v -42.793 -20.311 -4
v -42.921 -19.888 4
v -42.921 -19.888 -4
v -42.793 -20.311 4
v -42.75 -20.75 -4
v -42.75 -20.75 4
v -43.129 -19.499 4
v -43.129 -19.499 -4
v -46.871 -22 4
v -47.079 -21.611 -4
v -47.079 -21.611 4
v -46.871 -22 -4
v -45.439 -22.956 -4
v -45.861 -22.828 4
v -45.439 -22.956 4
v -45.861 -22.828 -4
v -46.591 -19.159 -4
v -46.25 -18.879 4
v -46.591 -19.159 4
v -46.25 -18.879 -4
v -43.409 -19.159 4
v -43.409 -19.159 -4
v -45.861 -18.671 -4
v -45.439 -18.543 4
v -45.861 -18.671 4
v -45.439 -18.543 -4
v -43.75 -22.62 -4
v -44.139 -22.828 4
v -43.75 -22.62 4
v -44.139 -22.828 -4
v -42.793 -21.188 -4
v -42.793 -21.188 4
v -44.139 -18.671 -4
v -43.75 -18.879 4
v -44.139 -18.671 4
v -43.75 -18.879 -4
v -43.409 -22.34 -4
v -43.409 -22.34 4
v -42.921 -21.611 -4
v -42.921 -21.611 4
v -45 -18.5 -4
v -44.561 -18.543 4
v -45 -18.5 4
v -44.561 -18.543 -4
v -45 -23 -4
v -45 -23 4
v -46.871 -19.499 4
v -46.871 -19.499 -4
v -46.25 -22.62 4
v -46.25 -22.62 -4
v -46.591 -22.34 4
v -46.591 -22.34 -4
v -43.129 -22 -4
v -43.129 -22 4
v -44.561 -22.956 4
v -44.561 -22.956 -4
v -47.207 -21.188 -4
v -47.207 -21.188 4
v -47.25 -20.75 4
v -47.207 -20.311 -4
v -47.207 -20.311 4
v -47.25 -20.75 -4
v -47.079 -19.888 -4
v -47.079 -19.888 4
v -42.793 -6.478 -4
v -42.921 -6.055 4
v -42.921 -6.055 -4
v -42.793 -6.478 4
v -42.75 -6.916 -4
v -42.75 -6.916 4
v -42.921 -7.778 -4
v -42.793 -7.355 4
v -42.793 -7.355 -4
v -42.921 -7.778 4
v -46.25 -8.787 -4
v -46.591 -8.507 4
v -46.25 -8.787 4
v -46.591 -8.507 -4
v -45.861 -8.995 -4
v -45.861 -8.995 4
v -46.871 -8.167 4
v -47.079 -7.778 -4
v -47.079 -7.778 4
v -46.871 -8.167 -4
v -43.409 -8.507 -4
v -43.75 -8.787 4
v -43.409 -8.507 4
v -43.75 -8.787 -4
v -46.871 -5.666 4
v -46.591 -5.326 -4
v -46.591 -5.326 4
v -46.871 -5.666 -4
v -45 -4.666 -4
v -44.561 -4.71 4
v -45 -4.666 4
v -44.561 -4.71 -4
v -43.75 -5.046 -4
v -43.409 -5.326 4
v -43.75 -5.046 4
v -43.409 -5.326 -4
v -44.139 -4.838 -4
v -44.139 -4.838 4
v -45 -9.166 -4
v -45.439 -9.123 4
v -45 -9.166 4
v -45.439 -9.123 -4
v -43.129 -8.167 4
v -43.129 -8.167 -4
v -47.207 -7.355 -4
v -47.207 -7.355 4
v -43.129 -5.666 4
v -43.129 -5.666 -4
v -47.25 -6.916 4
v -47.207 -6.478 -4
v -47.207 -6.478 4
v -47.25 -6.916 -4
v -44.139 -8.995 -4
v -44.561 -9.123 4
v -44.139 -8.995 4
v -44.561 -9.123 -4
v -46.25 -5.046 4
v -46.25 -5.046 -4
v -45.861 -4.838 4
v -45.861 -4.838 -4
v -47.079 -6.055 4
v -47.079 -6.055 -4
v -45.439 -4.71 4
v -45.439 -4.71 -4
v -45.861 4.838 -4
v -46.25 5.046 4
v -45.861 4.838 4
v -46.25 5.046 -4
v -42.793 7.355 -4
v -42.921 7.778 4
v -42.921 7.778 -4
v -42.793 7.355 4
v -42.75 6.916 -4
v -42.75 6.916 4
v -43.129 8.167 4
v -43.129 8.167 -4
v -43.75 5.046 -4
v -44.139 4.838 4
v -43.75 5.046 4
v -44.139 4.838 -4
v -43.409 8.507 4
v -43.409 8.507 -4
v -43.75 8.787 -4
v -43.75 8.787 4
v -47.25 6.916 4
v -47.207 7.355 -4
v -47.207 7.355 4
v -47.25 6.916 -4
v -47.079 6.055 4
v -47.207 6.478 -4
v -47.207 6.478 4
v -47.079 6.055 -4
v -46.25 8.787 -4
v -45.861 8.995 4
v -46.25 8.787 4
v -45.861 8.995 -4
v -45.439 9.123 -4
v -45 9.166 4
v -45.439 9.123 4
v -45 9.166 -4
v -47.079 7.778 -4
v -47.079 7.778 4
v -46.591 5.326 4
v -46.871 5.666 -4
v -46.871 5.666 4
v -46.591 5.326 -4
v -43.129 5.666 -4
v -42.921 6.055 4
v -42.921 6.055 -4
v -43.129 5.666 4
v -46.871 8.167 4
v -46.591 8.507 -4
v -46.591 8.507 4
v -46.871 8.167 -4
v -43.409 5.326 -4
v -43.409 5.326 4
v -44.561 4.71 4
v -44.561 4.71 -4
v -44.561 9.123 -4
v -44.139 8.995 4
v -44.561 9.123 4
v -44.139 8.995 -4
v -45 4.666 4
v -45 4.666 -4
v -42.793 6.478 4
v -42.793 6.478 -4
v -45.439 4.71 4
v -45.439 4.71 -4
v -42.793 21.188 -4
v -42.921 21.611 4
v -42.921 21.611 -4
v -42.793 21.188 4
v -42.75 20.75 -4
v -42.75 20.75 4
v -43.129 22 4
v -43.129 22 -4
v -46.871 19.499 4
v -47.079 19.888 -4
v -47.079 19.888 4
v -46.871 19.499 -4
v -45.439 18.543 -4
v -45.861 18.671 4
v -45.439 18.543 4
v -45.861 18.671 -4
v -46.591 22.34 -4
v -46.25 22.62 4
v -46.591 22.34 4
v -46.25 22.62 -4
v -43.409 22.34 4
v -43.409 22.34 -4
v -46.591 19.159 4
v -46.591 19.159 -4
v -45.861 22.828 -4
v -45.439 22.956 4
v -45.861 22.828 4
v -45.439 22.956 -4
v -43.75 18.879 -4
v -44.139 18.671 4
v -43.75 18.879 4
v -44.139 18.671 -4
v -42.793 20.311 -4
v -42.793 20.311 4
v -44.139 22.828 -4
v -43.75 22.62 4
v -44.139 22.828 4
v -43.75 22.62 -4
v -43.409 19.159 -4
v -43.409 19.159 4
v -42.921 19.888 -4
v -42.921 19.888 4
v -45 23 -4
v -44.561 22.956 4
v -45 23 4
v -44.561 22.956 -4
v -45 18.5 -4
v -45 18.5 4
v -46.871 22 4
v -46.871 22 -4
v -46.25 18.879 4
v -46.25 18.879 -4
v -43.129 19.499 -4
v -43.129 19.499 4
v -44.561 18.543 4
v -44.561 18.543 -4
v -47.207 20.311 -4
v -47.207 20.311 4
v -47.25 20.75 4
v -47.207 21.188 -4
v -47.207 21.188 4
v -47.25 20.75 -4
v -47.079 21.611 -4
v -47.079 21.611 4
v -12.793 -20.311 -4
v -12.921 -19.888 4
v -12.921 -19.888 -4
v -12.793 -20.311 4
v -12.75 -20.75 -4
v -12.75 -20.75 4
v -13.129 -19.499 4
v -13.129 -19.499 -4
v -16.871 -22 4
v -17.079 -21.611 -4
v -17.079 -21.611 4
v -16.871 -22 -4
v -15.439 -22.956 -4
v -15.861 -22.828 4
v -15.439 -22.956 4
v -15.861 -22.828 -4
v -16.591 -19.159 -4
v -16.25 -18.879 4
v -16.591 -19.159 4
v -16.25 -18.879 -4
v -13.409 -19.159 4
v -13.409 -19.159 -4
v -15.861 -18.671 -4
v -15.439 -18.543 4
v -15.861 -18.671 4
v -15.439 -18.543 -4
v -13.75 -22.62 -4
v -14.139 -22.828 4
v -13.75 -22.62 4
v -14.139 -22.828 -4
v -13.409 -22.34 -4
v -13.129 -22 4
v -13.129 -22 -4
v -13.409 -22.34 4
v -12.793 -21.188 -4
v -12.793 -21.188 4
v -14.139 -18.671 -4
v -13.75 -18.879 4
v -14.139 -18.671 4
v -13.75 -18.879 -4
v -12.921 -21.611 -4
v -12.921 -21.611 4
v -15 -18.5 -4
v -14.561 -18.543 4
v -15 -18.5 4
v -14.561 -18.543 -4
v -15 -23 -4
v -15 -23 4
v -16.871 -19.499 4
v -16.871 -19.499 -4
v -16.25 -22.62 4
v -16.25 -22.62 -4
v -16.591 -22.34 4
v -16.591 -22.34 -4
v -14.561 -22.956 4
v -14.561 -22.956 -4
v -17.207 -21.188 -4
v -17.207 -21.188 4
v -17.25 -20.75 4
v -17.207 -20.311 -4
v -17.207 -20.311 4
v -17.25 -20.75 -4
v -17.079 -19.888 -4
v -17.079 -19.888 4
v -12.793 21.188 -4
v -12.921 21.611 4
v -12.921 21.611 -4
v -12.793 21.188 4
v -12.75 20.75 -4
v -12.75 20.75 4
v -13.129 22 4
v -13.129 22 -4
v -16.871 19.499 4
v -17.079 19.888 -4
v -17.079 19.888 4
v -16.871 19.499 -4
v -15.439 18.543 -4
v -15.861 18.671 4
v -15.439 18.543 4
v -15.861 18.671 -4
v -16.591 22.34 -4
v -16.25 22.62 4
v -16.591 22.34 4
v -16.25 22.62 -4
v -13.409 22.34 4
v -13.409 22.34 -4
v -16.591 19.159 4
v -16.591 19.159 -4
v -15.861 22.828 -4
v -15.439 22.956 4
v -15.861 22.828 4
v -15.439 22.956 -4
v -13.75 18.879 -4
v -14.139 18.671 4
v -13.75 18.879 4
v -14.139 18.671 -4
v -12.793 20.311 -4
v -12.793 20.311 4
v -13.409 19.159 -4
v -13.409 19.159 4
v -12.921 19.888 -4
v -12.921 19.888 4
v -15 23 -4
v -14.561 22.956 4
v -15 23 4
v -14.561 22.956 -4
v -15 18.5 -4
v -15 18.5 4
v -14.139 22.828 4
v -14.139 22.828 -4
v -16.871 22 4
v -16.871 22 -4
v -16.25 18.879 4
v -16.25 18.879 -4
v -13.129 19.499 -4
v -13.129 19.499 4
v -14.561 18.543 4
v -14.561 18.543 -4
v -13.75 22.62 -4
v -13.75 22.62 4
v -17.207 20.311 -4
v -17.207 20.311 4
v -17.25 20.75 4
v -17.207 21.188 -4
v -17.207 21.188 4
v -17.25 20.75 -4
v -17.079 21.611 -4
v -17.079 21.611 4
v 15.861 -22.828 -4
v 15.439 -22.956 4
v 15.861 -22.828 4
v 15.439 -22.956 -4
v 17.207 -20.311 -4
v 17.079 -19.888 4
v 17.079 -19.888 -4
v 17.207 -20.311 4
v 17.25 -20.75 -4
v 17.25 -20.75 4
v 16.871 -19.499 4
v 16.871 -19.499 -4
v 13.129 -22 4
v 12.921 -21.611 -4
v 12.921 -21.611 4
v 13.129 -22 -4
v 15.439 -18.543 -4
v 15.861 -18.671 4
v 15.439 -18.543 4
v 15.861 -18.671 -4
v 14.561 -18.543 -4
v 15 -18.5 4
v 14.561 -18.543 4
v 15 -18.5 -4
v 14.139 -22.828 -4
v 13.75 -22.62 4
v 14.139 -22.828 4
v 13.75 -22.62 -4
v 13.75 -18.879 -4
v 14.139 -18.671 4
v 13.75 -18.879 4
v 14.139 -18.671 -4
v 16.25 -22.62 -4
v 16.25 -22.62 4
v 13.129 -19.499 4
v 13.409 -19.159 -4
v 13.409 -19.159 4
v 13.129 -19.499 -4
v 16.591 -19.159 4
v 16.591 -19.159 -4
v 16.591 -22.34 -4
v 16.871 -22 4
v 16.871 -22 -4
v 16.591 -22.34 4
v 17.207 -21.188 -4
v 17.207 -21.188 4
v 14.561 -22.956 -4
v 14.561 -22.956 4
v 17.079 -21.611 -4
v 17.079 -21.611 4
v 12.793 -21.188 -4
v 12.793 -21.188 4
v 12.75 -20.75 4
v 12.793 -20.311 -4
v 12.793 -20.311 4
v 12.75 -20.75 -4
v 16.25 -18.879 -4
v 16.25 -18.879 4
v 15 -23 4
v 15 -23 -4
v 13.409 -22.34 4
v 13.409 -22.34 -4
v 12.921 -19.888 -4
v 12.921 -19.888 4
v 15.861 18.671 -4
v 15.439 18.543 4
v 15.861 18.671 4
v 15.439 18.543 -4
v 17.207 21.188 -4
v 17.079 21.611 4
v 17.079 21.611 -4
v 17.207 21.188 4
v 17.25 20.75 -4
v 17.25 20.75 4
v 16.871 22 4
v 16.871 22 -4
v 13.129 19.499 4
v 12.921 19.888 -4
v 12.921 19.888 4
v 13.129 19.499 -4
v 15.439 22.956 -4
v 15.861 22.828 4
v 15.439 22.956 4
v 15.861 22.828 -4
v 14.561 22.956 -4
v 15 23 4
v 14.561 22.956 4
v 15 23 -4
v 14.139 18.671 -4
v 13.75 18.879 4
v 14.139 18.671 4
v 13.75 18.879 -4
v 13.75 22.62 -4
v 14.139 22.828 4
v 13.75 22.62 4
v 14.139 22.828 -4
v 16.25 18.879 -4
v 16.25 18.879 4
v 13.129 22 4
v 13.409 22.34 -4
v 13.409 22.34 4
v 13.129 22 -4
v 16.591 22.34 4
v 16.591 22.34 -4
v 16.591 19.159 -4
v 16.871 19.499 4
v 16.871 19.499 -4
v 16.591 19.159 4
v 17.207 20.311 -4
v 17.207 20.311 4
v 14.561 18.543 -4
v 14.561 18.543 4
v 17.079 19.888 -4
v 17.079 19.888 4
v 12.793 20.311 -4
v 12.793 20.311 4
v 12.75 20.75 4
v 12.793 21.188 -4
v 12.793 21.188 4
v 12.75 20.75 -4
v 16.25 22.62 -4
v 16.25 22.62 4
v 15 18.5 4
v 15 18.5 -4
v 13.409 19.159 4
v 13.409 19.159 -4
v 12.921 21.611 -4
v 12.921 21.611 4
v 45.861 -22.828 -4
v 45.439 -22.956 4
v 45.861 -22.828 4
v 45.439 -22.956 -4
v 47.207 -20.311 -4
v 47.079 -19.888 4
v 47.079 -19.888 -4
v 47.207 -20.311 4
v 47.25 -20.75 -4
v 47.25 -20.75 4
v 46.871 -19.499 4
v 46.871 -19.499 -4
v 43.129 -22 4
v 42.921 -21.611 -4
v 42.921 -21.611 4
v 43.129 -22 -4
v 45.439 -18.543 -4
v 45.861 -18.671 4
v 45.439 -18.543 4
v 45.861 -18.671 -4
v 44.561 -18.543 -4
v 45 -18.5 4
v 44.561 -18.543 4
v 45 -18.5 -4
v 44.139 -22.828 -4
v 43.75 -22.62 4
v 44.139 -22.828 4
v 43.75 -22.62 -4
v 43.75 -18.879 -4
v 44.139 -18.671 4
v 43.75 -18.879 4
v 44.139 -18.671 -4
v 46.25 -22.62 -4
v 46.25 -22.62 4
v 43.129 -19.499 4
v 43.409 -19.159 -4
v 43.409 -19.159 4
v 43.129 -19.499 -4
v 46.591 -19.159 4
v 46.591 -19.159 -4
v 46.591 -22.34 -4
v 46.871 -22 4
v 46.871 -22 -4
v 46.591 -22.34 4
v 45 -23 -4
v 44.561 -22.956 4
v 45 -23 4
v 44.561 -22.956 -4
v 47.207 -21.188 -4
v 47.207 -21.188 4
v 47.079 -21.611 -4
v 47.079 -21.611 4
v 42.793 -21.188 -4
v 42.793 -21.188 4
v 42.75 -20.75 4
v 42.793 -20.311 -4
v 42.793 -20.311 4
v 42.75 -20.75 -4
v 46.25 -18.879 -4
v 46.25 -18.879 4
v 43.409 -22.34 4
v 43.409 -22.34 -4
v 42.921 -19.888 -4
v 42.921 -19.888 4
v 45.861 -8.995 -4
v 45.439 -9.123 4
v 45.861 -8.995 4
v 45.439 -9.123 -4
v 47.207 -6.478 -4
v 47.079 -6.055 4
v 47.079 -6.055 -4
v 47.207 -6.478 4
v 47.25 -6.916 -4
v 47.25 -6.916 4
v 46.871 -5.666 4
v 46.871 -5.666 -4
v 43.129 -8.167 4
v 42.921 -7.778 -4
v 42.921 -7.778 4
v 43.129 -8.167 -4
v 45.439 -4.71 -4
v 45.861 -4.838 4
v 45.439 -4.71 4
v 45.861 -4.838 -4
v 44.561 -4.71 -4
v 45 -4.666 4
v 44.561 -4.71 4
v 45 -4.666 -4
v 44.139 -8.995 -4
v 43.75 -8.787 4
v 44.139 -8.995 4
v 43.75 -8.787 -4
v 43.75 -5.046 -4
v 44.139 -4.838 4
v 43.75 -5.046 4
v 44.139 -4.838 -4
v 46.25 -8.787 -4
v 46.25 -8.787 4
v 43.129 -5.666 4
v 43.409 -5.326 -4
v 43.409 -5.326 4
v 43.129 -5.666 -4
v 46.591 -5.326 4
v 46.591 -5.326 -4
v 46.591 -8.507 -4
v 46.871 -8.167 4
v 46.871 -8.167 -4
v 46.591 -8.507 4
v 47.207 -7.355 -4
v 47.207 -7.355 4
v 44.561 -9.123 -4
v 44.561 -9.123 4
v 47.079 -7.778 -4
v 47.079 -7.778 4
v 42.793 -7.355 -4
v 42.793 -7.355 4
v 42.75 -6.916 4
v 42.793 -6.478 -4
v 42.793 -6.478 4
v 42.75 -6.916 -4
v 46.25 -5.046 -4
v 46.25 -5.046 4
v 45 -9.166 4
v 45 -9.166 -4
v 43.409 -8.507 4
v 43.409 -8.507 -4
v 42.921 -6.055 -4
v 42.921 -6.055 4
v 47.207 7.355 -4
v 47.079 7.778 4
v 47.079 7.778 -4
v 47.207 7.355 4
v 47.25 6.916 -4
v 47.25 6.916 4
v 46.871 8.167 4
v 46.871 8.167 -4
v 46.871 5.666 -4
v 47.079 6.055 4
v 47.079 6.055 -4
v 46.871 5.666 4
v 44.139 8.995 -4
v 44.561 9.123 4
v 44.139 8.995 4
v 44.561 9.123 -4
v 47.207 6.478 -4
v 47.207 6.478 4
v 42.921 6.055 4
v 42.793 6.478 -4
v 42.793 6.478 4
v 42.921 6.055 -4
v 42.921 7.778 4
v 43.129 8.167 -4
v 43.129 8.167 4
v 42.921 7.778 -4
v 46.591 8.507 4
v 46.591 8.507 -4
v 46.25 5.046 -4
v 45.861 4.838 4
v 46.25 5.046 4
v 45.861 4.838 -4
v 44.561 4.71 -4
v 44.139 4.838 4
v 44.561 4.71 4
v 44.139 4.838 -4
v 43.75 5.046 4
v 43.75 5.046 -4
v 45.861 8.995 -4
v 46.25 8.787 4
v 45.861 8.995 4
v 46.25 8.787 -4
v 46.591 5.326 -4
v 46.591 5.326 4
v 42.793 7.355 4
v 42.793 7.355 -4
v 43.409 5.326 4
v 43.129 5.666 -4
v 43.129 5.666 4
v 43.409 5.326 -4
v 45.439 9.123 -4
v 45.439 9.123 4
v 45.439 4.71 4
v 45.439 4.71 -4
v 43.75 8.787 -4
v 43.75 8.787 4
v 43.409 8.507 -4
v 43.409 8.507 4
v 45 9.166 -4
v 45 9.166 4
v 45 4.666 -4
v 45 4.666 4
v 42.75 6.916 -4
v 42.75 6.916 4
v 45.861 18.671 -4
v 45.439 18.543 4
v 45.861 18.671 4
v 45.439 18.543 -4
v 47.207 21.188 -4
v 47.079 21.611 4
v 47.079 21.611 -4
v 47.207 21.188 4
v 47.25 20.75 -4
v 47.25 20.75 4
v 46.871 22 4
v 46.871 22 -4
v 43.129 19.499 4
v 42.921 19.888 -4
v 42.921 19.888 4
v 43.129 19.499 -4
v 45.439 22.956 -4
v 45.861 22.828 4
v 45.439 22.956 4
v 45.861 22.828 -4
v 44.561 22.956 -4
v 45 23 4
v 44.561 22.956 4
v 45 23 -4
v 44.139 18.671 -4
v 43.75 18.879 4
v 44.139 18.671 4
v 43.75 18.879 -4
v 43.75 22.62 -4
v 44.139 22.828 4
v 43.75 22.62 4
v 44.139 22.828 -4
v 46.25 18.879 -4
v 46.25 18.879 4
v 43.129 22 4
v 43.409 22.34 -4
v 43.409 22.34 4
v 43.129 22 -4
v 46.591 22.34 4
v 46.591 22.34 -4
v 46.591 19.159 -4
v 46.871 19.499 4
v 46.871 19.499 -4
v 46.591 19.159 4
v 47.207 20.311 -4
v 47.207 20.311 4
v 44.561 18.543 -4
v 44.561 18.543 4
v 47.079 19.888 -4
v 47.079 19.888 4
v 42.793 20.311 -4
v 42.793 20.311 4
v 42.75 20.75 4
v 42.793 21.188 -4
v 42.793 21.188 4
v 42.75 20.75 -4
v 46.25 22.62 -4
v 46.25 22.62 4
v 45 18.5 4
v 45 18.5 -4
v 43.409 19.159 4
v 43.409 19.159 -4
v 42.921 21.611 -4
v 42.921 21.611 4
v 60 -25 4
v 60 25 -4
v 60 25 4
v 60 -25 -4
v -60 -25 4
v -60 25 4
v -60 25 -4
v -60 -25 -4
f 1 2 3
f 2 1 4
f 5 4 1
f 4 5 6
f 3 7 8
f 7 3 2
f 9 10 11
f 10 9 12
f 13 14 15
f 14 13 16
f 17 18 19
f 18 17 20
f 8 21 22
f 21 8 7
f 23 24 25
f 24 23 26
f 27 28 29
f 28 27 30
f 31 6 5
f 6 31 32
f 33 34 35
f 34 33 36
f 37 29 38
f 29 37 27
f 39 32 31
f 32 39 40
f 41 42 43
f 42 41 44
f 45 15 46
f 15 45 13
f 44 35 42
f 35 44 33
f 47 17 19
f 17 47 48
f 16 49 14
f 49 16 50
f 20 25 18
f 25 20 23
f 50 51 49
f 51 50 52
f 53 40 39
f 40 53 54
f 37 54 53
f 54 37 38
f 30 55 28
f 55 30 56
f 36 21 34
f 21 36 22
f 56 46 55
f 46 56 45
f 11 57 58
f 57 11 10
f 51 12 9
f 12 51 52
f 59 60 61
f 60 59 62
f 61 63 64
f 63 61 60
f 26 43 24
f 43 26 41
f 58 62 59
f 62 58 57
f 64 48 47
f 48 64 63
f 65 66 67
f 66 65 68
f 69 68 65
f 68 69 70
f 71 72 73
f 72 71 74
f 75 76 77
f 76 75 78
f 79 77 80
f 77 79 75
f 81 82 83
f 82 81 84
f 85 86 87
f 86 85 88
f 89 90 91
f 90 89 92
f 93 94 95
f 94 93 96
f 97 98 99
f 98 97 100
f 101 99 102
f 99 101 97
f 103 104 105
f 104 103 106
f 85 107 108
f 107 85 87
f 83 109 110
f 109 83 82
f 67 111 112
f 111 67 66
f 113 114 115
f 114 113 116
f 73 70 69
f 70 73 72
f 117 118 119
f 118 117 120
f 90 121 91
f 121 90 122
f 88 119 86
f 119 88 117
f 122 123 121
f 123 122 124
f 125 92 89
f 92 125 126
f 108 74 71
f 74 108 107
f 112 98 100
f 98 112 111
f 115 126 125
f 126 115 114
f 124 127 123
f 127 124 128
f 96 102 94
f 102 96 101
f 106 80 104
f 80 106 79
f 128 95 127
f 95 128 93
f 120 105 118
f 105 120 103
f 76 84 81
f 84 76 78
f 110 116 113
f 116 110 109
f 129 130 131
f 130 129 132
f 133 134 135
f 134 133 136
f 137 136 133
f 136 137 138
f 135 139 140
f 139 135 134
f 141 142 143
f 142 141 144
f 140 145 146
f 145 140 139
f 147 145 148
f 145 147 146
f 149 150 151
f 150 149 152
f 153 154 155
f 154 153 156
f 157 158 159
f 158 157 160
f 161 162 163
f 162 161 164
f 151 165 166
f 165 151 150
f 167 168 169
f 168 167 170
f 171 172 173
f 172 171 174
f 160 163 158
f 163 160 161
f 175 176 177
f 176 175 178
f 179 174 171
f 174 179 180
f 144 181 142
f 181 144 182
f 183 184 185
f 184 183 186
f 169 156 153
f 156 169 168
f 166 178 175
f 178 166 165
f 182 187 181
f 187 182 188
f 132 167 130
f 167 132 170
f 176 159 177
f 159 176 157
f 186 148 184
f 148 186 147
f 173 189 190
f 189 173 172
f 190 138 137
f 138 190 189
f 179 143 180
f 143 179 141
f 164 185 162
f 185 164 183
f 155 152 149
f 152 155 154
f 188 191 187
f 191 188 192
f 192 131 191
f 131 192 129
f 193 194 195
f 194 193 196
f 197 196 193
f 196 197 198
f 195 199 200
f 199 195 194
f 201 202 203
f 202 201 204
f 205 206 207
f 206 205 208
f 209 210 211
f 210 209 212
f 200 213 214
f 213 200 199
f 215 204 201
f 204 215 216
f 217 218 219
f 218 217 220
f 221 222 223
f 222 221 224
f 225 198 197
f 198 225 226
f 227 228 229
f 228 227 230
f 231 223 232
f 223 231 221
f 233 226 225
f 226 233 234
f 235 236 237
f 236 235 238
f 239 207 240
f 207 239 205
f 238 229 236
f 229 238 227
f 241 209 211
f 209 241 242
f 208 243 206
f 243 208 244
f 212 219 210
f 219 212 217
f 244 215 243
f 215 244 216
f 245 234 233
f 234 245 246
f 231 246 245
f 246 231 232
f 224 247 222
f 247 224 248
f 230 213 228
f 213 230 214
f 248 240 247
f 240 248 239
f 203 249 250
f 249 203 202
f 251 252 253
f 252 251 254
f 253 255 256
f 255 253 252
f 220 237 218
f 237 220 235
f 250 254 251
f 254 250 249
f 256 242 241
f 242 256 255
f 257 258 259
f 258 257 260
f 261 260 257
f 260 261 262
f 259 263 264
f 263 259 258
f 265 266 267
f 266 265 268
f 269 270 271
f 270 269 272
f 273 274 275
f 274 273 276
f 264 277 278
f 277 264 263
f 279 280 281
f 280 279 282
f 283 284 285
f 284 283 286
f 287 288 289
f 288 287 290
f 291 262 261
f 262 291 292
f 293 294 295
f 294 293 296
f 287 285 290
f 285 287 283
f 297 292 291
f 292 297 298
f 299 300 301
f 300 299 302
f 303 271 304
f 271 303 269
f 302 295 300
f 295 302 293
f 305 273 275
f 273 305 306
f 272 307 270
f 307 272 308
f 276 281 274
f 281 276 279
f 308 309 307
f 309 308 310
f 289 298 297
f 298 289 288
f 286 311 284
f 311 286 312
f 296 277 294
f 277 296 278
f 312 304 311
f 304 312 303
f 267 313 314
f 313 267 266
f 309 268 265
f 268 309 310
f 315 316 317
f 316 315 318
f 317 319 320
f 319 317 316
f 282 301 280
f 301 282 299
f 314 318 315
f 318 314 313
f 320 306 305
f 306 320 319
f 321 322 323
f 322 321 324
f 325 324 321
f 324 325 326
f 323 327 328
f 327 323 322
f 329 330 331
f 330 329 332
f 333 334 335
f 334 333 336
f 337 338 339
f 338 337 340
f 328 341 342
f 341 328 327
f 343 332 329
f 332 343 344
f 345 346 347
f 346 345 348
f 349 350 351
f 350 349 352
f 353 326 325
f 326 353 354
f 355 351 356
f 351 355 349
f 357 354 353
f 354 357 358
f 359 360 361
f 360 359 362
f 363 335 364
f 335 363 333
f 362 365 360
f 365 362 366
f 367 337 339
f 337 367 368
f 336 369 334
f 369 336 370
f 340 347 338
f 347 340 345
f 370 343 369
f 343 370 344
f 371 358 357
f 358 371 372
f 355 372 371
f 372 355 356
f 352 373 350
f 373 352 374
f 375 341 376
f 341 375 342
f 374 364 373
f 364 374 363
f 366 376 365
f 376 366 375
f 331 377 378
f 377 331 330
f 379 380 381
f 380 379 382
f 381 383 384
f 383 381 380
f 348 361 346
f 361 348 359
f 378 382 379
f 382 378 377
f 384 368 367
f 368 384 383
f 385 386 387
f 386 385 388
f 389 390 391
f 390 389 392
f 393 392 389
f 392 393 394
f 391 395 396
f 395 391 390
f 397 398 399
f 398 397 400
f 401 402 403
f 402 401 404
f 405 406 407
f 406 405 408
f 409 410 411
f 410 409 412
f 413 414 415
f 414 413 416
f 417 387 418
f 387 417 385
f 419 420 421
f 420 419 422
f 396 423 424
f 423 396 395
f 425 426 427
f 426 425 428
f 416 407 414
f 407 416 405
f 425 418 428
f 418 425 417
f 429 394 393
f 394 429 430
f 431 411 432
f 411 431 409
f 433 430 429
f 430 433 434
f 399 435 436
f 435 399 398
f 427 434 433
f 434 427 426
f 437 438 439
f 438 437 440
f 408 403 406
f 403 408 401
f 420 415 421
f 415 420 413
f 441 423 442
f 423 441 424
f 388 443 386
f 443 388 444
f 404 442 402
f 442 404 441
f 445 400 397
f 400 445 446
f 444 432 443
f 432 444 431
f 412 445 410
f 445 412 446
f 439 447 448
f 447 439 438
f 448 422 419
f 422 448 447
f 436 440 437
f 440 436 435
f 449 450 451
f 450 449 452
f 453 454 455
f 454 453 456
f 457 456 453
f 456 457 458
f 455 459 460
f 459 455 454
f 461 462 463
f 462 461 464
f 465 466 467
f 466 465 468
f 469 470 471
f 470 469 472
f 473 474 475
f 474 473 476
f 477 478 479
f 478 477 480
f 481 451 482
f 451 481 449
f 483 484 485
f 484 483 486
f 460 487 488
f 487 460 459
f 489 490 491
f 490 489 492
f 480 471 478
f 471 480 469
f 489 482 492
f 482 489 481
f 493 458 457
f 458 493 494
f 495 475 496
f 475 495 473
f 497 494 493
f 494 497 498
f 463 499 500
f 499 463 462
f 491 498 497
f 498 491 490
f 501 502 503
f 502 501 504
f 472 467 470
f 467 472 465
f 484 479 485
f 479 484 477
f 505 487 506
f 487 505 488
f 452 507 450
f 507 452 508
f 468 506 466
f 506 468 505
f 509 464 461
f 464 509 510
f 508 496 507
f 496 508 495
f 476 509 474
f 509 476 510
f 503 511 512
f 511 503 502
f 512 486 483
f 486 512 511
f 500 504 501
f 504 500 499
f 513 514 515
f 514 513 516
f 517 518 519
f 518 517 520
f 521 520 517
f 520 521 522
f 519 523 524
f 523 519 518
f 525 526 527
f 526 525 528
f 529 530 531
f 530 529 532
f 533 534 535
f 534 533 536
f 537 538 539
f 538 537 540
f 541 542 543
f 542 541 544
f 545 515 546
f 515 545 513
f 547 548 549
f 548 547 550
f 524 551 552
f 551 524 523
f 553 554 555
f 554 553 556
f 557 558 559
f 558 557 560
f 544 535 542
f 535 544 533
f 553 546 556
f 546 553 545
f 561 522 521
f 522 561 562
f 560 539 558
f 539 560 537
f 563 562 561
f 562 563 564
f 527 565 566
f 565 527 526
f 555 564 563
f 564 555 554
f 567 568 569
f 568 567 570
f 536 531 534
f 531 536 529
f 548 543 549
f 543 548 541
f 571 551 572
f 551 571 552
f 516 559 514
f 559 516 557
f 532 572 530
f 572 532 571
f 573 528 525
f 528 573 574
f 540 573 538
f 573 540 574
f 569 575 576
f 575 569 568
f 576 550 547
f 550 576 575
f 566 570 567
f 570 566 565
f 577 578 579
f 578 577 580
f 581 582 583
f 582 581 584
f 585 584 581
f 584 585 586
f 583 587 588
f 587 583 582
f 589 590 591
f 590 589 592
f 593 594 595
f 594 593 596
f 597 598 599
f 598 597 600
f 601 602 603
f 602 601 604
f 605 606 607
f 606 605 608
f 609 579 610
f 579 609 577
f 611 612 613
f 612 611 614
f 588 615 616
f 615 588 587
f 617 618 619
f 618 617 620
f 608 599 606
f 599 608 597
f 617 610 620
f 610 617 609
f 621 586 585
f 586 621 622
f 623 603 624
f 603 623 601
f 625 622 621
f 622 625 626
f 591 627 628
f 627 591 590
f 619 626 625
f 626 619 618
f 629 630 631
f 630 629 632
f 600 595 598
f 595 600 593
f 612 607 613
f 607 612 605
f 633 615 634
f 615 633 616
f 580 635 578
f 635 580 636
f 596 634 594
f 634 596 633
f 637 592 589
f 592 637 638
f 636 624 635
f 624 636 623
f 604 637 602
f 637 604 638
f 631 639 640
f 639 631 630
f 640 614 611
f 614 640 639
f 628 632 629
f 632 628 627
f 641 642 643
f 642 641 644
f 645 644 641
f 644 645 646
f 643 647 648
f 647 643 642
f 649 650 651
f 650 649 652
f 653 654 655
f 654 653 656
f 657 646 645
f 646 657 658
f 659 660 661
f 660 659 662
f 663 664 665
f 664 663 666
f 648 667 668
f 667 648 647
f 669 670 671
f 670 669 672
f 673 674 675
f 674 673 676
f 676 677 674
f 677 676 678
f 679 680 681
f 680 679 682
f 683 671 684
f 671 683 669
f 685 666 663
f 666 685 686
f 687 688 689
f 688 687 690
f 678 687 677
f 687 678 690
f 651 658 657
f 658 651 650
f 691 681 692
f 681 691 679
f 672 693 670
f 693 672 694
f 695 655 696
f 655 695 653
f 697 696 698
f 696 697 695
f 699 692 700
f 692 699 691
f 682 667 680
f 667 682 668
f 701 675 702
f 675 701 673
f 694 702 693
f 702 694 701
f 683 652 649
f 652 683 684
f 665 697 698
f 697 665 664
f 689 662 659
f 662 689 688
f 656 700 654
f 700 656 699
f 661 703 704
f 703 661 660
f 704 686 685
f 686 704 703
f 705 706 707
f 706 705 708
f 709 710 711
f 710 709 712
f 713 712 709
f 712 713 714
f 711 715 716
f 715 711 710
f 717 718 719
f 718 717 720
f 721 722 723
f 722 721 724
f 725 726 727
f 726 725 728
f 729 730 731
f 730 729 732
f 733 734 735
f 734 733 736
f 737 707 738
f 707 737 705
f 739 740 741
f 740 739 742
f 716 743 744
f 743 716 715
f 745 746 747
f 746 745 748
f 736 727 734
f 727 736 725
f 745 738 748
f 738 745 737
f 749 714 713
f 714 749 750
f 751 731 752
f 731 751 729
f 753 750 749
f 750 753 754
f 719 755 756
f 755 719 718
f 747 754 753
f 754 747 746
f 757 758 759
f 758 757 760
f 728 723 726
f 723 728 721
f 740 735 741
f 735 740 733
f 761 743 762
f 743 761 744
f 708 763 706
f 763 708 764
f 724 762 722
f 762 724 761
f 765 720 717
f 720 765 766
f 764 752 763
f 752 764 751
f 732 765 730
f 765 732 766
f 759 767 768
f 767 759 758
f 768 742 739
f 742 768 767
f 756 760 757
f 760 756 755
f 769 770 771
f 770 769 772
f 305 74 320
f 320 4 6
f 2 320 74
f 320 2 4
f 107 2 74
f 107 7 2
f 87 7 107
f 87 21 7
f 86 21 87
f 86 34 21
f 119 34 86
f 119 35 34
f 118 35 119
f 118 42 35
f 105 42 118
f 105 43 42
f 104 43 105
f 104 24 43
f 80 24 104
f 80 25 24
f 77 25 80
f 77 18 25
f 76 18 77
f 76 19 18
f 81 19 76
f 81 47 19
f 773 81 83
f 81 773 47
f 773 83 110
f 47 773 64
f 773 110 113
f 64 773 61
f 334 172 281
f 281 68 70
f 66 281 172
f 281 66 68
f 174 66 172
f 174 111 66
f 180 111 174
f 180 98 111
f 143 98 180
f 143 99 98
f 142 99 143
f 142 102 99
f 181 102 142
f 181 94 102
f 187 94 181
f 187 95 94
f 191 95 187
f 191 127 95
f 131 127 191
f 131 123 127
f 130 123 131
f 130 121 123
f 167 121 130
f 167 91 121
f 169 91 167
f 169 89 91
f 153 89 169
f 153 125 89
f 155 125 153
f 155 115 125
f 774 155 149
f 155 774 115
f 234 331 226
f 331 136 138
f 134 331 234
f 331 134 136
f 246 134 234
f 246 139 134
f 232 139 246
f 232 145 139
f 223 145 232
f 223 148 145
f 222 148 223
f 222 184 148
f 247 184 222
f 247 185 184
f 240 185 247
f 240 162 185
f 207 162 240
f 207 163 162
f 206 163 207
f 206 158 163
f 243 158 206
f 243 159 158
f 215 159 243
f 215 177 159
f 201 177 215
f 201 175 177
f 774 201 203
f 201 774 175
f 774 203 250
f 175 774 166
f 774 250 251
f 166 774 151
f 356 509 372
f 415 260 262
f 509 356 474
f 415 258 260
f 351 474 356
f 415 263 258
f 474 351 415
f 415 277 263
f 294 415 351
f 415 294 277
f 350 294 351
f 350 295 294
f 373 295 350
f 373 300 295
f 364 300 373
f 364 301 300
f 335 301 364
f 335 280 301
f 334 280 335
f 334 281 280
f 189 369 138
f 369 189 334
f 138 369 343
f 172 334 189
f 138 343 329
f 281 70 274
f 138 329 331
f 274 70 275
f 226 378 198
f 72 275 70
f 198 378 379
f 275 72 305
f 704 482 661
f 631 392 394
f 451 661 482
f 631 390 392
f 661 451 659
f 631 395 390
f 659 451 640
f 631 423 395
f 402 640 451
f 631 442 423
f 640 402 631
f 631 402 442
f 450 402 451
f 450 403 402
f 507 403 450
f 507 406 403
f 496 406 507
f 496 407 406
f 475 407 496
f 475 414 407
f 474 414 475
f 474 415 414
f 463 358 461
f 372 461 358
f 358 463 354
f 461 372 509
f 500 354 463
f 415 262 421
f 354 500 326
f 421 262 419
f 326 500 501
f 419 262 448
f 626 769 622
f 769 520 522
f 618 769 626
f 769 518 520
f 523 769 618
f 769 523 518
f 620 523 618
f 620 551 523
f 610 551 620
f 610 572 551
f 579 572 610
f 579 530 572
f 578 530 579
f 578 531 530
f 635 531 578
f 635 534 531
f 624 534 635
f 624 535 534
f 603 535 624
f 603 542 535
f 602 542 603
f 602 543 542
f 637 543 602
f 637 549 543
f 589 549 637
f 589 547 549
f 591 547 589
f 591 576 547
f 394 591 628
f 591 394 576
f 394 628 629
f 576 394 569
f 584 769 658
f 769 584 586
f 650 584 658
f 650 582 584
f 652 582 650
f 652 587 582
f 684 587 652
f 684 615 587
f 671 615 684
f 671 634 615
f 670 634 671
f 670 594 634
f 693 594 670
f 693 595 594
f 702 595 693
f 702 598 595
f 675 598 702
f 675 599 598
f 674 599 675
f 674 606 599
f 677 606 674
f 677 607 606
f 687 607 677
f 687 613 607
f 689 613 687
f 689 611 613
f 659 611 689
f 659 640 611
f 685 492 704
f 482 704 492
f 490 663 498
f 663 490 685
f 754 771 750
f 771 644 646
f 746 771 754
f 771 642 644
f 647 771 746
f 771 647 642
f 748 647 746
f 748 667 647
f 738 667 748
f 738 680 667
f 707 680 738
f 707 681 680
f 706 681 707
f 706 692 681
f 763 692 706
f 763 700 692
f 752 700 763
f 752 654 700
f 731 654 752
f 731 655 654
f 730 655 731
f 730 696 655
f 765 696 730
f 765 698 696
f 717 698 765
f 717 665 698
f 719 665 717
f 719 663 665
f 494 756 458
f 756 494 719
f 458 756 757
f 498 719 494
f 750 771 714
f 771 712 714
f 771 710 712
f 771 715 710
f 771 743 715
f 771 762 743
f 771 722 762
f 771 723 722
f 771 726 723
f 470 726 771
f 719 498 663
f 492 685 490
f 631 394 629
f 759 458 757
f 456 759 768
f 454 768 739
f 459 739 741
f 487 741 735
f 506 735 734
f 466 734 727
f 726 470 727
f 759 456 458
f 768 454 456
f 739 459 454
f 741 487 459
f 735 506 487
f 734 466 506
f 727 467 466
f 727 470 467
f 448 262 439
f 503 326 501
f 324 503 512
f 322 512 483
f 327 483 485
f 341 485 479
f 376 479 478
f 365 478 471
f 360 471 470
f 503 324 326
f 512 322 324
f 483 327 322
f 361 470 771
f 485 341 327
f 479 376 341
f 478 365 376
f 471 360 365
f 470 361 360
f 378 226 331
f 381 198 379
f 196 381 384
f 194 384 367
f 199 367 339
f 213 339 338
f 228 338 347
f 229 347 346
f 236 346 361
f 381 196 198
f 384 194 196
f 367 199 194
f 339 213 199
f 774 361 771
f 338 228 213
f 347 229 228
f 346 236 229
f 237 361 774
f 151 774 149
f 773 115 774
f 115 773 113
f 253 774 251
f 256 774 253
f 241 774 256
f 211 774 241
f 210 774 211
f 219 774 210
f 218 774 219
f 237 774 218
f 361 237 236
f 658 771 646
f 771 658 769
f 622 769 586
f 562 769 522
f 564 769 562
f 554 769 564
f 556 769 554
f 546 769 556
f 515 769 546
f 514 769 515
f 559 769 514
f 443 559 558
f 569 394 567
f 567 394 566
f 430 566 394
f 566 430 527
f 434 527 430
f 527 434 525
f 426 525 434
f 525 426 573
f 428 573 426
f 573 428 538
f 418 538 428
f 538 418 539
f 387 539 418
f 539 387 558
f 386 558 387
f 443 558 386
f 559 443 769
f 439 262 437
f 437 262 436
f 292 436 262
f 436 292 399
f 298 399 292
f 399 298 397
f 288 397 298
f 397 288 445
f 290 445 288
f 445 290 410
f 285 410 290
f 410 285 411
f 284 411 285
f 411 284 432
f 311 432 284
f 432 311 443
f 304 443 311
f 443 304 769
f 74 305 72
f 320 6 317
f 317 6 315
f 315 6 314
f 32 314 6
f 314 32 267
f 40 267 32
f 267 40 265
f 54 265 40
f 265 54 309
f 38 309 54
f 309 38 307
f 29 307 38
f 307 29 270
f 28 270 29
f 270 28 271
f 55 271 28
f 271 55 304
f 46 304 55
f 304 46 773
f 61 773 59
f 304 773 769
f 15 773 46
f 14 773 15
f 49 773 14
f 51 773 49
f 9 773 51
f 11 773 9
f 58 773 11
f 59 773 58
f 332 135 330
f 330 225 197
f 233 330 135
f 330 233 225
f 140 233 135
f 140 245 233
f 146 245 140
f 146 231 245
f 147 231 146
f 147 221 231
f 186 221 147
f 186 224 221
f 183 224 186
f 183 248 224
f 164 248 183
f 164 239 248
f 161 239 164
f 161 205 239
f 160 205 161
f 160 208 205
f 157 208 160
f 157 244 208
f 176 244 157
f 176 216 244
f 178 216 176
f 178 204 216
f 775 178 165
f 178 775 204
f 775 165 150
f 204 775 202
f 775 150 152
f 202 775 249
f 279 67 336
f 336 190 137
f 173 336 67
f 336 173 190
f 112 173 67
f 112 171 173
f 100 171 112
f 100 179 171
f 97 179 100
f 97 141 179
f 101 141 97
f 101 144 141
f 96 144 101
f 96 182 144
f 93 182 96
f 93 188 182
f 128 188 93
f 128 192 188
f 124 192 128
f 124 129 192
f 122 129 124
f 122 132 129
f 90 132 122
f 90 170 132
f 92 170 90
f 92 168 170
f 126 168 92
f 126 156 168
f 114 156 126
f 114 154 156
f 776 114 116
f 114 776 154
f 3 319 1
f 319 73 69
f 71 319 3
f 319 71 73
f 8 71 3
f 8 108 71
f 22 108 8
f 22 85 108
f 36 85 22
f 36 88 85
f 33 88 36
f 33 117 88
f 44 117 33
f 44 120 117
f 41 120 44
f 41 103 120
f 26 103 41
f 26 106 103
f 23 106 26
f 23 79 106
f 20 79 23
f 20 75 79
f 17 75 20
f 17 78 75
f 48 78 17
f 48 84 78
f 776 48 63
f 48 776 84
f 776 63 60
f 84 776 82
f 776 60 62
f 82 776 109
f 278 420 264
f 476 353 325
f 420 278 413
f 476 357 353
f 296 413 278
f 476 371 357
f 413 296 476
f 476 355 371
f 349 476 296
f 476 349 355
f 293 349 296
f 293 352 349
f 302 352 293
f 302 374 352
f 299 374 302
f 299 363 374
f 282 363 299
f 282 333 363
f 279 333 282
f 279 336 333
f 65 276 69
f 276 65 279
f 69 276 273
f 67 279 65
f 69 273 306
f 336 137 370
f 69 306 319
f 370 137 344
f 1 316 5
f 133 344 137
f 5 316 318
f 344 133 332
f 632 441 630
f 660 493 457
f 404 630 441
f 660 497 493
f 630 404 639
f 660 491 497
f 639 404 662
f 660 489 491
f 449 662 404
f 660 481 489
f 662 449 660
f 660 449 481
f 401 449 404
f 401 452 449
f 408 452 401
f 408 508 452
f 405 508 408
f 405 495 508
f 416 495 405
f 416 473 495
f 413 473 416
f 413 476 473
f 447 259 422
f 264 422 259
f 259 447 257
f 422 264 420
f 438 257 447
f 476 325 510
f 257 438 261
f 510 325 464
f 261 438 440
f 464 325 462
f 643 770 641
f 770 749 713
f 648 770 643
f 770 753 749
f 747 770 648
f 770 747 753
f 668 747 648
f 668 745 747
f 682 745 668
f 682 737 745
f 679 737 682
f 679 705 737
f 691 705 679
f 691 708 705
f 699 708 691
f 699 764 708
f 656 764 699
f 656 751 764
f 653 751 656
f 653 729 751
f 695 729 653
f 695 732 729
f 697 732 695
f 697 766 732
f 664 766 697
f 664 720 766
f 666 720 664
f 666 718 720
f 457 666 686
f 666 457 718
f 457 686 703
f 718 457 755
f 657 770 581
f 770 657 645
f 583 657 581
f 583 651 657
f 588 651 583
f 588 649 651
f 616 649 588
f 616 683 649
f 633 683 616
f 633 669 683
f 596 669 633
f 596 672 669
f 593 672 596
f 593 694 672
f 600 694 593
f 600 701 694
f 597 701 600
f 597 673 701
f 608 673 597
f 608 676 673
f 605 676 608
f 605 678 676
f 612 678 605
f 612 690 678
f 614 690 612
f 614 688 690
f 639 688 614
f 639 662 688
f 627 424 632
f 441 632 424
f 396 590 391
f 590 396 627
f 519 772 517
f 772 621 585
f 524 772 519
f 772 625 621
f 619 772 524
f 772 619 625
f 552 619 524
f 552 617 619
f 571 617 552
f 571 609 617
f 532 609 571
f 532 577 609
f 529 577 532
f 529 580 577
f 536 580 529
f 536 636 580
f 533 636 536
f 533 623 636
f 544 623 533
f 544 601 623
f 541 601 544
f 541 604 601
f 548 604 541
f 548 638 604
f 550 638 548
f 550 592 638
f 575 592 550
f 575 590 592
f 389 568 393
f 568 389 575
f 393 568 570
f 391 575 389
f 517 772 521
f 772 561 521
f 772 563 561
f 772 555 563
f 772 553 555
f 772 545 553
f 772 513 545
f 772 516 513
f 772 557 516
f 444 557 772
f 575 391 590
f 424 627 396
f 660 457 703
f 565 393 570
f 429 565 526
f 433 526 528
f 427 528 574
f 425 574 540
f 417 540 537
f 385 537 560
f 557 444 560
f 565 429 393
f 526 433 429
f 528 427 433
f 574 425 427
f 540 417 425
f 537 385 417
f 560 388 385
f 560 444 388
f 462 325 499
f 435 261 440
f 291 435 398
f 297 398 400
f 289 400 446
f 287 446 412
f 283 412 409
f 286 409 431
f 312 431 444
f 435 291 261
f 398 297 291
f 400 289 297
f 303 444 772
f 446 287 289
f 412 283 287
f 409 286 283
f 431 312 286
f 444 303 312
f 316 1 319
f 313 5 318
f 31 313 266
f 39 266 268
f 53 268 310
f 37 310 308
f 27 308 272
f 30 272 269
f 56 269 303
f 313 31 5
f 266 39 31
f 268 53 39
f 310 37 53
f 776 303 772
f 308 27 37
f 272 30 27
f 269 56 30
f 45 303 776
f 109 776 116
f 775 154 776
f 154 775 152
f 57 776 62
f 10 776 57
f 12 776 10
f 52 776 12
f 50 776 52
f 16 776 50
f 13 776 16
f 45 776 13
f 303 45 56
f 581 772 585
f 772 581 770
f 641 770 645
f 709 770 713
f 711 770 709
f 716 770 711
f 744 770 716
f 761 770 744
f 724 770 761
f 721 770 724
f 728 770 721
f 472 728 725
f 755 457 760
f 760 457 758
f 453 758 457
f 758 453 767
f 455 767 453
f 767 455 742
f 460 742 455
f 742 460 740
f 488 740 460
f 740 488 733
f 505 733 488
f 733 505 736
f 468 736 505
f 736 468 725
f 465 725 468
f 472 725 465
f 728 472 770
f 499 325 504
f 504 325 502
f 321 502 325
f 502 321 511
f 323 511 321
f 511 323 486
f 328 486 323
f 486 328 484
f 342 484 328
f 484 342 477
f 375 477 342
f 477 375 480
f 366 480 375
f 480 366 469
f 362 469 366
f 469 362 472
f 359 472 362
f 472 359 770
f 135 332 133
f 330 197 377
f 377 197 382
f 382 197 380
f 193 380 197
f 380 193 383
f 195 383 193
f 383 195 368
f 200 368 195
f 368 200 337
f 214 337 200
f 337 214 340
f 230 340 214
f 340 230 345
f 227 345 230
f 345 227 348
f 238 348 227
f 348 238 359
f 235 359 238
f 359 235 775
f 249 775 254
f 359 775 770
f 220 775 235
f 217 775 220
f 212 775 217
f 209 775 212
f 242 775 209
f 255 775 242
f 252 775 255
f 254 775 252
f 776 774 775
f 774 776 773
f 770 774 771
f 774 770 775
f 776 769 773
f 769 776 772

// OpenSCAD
$fn = 32;

// ----------------------------------------------------------------------
// Perforated panel 120 x 50 x 8
// 4 x 4 Ø4.5 holes, frame layout
// ----------------------------------------------------------------------

// --- parameters (mm) ---
panel = [120, 50, 8];  // overall size (x, y, z)
hole_d = 4.5;          // hole diameter
pitch_x = 30;          // hole pitch along X
pitch_y = 13.833;      // hole pitch along Y

// --- derived feature positions (mm) ---
margin = hole_d / 2 + 2;            // = 4.25   clearance from the panel edge
cols = floor((panel[0] - 2 * margin) / pitch_x) + 1;  // = 4   how many columns fit in X
rows = floor((panel[1] - 2 * margin) / pitch_y) + 1;  // = 4   how many rows fit in Y
span_x = (cols - 1) * pitch_x + 0;  // = 90   width of the field
span_y = (rows - 1) * pitch_y;      // = 41.5   height of the field
origin_x = -span_x / 2;             // = -45   X of the first hole
origin_y = -span_y / 2;             // = -20.75   Y of the first row
holes = 2 * cols + 2 * (rows - 2);  // = 12   holes around the frame
feature_centers = [
  [origin_x + 0 * pitch_x, origin_y + 0 * pitch_y],
  [origin_x + 0 * pitch_x, origin_y + 1 * pitch_y],
  [origin_x + 0 * pitch_x, origin_y + 2 * pitch_y],
  [origin_x + 0 * pitch_x, origin_y + 3 * pitch_y],
  [origin_x + 1 * pitch_x, origin_y + 0 * pitch_y],
  [origin_x + 1 * pitch_x, origin_y + 3 * pitch_y],
  [origin_x + 2 * pitch_x, origin_y + 0 * pitch_y],
  [origin_x + 2 * pitch_x, origin_y + 3 * pitch_y],
  [origin_x + 3 * pitch_x, origin_y + 0 * pitch_y],
  [origin_x + 3 * pitch_x, origin_y + 1 * pitch_y],
  [origin_x + 3 * pitch_x, origin_y + 2 * pitch_y],
  [origin_x + 3 * pitch_x, origin_y + 3 * pitch_y]
];   // hole centres, used verbatim by the cutter loop

// panel outline, every hole through
difference() {
  cube(panel, center = true);
  for (centre = feature_centers)
    translate([centre[0], centre[1], 0])
      cylinder(d = hole_d, h = panel[2] + 2, center = true);
}
